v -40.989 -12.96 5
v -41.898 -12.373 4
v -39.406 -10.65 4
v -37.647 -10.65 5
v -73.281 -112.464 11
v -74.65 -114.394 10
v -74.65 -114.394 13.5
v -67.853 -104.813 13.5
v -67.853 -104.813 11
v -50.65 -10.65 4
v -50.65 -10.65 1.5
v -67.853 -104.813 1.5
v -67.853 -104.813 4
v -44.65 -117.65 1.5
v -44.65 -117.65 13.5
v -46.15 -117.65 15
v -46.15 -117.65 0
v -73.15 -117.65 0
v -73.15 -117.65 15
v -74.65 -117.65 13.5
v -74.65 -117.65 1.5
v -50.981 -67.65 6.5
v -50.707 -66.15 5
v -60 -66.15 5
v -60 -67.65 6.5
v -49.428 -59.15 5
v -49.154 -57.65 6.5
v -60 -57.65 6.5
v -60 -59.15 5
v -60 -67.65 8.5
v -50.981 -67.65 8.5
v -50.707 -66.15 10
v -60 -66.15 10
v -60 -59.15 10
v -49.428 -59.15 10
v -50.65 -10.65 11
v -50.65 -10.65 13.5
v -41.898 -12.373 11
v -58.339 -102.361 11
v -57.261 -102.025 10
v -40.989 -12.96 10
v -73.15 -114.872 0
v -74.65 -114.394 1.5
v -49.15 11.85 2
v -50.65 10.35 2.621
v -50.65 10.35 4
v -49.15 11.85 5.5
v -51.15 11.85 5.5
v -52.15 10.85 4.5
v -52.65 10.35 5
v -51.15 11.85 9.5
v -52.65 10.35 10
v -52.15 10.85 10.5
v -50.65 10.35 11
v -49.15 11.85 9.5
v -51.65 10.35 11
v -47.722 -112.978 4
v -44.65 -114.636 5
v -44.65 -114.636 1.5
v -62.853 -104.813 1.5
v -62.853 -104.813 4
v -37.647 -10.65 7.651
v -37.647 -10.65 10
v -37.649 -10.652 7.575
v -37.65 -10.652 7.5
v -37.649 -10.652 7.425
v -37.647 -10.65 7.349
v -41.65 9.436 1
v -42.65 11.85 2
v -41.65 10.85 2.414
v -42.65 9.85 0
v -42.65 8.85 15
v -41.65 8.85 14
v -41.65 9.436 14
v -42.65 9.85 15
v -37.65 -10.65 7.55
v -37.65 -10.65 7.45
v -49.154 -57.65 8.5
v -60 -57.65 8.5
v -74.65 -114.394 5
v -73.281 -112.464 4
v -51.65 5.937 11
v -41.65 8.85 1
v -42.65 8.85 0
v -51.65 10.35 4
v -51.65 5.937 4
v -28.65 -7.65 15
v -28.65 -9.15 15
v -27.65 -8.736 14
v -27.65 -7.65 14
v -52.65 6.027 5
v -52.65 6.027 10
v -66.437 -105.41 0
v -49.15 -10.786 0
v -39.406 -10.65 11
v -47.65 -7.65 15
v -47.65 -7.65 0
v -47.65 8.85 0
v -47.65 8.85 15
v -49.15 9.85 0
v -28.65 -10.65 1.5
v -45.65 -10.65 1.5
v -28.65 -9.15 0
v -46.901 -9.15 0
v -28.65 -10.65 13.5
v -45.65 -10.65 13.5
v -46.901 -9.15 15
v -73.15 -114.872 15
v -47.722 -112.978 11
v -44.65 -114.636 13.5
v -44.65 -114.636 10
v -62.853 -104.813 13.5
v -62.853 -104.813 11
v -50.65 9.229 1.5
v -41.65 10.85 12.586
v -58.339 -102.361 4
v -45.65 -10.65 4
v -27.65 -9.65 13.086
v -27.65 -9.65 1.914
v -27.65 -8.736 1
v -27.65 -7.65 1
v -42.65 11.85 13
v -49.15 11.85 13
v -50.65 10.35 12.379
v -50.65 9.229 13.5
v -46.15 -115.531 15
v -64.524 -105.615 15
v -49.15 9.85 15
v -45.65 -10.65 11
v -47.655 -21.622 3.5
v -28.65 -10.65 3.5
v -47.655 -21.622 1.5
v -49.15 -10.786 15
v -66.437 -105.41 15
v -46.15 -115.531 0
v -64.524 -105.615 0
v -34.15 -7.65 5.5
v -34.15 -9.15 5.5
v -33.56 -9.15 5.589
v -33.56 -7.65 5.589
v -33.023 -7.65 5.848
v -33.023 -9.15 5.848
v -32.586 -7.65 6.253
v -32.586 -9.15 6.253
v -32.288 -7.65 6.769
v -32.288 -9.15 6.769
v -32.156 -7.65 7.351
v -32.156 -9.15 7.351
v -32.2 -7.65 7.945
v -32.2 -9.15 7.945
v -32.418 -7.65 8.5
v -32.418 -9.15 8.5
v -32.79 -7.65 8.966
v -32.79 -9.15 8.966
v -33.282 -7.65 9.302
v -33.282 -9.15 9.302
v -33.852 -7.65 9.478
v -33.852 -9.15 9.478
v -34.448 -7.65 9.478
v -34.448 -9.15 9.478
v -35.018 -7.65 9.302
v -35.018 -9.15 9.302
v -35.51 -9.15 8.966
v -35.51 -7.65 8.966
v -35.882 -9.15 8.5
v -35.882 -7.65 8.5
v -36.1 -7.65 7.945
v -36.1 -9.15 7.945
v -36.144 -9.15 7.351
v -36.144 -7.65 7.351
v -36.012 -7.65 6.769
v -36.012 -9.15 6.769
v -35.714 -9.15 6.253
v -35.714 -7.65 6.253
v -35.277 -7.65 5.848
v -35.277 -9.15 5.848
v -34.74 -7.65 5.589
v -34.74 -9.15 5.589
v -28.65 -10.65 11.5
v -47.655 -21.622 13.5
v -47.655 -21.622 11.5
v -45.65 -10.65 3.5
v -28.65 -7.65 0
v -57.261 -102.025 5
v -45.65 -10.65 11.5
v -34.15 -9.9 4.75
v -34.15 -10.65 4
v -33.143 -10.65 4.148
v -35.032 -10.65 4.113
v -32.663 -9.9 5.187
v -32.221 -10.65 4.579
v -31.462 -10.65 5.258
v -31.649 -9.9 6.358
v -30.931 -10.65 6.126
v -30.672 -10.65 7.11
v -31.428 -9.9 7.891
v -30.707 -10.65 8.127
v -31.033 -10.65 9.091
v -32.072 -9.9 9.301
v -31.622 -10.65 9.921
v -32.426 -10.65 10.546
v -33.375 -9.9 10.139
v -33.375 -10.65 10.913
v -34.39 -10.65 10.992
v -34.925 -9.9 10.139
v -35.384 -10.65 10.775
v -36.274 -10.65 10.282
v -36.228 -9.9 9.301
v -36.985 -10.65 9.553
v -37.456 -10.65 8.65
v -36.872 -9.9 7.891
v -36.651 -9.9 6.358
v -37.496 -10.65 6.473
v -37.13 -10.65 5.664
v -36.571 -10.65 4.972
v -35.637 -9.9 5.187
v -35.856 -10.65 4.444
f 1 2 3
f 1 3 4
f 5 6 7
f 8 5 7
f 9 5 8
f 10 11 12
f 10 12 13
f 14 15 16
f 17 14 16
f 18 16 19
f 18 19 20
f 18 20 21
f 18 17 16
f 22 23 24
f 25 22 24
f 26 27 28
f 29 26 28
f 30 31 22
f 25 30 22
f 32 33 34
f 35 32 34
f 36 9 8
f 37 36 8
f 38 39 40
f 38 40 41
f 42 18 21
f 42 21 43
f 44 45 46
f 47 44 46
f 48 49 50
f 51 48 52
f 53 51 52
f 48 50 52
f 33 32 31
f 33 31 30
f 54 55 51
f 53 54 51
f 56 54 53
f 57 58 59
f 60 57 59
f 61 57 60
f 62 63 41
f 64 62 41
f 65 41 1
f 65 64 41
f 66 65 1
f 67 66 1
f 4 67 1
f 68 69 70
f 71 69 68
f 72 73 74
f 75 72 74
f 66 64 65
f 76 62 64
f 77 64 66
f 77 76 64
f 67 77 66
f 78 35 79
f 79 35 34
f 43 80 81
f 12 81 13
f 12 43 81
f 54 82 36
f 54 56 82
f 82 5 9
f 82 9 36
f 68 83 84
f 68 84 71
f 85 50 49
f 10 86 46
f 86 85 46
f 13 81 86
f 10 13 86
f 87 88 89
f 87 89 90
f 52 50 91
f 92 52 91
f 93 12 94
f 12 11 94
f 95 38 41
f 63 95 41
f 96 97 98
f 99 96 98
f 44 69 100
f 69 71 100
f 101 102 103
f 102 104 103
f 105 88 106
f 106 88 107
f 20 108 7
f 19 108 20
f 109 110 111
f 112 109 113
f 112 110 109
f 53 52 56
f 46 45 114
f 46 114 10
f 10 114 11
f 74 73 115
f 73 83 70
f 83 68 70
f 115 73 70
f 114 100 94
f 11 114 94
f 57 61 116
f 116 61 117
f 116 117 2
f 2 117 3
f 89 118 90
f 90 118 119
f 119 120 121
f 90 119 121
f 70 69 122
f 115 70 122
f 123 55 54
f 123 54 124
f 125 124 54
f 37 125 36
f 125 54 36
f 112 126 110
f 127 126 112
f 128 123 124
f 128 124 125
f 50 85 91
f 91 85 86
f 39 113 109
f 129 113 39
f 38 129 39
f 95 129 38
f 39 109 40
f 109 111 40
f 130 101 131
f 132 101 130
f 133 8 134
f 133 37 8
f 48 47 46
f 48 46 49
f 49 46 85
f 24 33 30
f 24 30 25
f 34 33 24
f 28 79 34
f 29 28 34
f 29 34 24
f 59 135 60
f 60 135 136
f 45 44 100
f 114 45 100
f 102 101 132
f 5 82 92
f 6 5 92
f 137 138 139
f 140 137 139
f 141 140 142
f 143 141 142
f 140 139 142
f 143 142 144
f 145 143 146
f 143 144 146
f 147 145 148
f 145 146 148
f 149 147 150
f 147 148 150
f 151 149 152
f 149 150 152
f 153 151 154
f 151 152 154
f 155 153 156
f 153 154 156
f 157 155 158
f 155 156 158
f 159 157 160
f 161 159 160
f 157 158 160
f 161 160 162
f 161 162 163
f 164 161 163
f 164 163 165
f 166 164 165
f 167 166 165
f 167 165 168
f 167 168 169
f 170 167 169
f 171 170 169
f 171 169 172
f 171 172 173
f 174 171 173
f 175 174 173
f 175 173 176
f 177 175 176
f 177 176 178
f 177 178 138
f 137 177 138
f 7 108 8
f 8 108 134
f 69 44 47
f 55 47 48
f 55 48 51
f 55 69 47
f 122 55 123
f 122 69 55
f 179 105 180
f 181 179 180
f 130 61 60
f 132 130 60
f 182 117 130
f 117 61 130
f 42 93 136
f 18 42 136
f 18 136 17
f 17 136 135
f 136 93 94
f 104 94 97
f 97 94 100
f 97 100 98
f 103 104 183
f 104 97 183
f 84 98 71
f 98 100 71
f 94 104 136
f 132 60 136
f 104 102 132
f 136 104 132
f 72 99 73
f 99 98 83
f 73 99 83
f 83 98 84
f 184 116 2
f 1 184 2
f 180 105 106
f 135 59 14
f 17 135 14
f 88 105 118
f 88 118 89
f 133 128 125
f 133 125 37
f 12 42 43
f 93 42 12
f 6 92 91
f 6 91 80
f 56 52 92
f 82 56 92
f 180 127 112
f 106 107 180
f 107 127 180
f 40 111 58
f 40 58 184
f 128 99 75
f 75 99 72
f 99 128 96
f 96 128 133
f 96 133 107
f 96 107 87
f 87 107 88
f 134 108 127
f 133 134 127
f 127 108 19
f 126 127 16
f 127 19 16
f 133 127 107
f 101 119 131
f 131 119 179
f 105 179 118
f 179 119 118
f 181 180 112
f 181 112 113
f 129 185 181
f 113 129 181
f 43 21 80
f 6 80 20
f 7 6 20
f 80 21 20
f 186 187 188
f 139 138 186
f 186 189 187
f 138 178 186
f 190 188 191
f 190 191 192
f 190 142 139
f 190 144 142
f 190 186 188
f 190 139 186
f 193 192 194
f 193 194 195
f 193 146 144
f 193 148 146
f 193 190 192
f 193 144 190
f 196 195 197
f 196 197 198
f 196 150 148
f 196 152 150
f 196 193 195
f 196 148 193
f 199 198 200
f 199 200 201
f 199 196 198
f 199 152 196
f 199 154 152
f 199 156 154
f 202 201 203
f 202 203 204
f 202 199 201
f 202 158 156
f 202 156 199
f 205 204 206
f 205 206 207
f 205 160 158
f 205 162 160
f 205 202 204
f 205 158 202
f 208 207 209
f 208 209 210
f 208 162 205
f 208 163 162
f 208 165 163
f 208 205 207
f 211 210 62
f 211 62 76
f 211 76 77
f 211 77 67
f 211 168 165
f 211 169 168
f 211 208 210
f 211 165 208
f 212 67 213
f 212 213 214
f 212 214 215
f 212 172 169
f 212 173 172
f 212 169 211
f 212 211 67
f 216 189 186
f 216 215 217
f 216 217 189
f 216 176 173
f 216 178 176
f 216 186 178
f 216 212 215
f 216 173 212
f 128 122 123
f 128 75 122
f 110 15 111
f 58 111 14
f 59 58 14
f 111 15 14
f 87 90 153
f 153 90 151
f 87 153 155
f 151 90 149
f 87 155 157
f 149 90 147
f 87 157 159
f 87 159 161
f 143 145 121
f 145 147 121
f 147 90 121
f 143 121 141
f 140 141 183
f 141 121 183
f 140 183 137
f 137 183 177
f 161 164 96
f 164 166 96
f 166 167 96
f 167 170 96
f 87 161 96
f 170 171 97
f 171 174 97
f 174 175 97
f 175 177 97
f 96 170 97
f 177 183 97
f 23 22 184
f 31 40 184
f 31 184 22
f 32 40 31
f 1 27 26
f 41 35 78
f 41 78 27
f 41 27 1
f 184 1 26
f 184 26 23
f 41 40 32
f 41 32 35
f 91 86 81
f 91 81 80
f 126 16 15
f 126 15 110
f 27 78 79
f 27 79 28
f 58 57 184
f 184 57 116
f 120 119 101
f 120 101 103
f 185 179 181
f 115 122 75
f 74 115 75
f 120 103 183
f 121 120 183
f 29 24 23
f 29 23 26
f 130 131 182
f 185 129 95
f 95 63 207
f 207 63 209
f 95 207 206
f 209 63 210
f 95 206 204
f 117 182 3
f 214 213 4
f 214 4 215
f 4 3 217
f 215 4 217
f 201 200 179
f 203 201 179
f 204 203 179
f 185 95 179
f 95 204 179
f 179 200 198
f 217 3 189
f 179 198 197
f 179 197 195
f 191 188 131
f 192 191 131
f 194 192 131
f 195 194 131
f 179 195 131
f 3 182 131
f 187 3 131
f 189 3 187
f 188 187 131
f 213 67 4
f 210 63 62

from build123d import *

# Parameters (mm, degrees)
RESSALTO_EXTRUS_O1_DEPTH  = 15
ESBO_O7_W                 = 30
ESBO_O7_H                 = 15
RESSALTO_EXTRUS_O3_DEPTH  = 3
ESBO_O14_W                = 7
ESBO_O14_H                = 107.753429602
RESSALTO_EXTRUS_O5_DEPTH  = 2
ESBO_O15_W                = 7
ESBO_O15_H                = 107.852923352
RESSALTO_EXTRUS_O6_DEPTH  = 2
ESBO_O16_W                = 7
ESBO_O16_H                = 22.5
RESSALTO_EXTRUS_O9_DEPTH  = 2
CHANFRO11_SIZE            = 20.026147127
CHANFRO11_SIZE_2          = 10
CHANFRO12_SIZE            = 5.181688732
CHANFRO12_SIZE_2          = 10
CHANFRO13_SIZE            = 2
CHANFRO14_SIZE            = 4.8
CHANFRO14_SIZE2           = 5.970145796
CHANFRO16_SIZE            = 1.5
CHANFRO17_SIZE            = 1.5
CHANFRO18_SIZE            = 1
ESBO_O17_R                = 2
CORTE_EXTRUS_O1_DEPTH     = 5
CHANFRO20_SIZE            = 1
RESSALTO_EXTRUS_O10_DEPTH = 7
RESSALTO_EXTRUS_O11_DEPTH = 2
RESSALTO_EXTRUS_O13_DEPTH = 2
ESBO_O23_W                = 5
ESBO_O23_H                = 10
CORTE_EXTRUS_O2_DEPTH     = 60
CHANFRO22_SIZE            = 1.5
CHANFRO21_SIZE            = 1


# Some blends are built 0.0001 mm under size
with BuildPart() as part:
    # Esboço2 → Ressalto-extrusão1 (new body)
    with BuildSketch(Plane.XY):
        Polygon((-41.65, 8.85), (-41.65, 11.85), (-50.65, 11.85), (-50.65, -10.65), (-27.65, -10.65), (-27.65, -7.65), (-47.65, -7.65), (-47.65, 8.85), align=None)
    extrude(amount=RESSALTO_EXTRUS_O1_DEPTH)



with BuildPart() as body_2:
    # Esboço7 → Ressalto-extrusão3 (new body)
    with BuildSketch(Plane(origin=(0, -117.65, 0), x_dir=(-1, 0, 0), z_dir=(0, -1, 0))):
        with Locations((59.65, -7.5)):
            Rectangle(ESBO_O7_W, ESBO_O7_H)
    extrude(amount=-RESSALTO_EXTRUS_O3_DEPTH)


with BuildPart() as part_1:
    add(part.part)

    add(body_2.part)  # Loft3 merges body 2
    # Esboço9 → Loft3 section 0
    with BuildSketch(Plane(origin=(0, -114.65, 0), x_dir=(1, 0, 0), z_dir=(0, 1, 0))):
        with BuildLine():
            Line((-69.65, -15), (-64.65, -15))
            Line((-64.65, -15), (-64.65, 0))
            Line((-64.65, 0), (-69.65, 0))
            Line((-69.65, 0), (-69.65, -15))
        make_face()
    # Esboço8 → Loft3 section 1
    with BuildSketch(Plane.XZ.offset(10.65)):
        with BuildLine():
            Line((-50.65, 15), (-45.65, 15))
            Line((-45.65, 15), (-45.65, 0))
            Line((-45.65, 0), (-50.65, 0))
            Line((-50.65, 0), (-50.65, 15))
        make_face()
    loft()

    # Esboço14 → Ressalto-extrusão5 (add)
    with BuildSketch(Plane(origin=(-42.292744028, 7.726559005, 0), x_dir=(0, 0, -1), z_dir=(0.9837182167305484, -0.17971775113346497, 0))):
        with Locations((-7.5, -70.525331358)):
            Rectangle(ESBO_O14_W, ESBO_O14_H)
    extrude(amount=RESSALTO_EXTRUS_O5_DEPTH)

    # Esboço15 → Ressalto-extrusão6 (add)
    with BuildSketch(Plane(origin=(-47.131251678, 8.610517133, 0), x_dir=(0, 0, 1), z_dir=(-0.9837182167305483, 0.17971775113346522, 0))):
        with Locations((7.5, -73.505764779)):
            Rectangle(ESBO_O15_W, ESBO_O15_H)
    extrude(amount=RESSALTO_EXTRUS_O6_DEPTH)

    # Esboço16 → Ressalto-extrusão9 (add)
    with BuildSketch(Plane.ZY.offset(50.65)):
        with Locations((7.5, 0.6)):
            Rectangle(ESBO_O16_W, ESBO_O16_H)
    extrude(amount=RESSALTO_EXTRUS_O9_DEPTH)

    # Chanfro11
    # the kernel refuses this chamfer: 20.026147127, 10 mm, written as the material it adds along each edge
    with BuildSketch(Plane(origin=(-64.65, -114.65, 55.83646579), x_dir=(0.9998316750706326, -0.018347248443652868, 0), z_dir=(0, 0, -1))) as chanfro11_piece_1_section:
        Polygon((CHANFRO11_SIZE * 0.999831675085, -CHANFRO11_SIZE * 0.0183472484439), (CHANFRO11_SIZE_2 * 0.161638977635, -CHANFRO11_SIZE_2 * 0.986849958661), (0, 0), align=None)
    chanfro11_piece_1 = extrude(amount=55.83646579, mode=Mode.PRIVATE)
    chanfro11_piece_1 = split(chanfro11_piece_1, bisect_by=Plane(origin=(-44.65, -111.70383057, 13), z_dir=(-1, 0, 0)), keep=Keep.TOP, mode=Mode.PRIVATE)
    chanfro11_piece_1 = split(chanfro11_piece_1, bisect_by=Plane(origin=(-56.081001228, -111.70383057, 15), z_dir=(0, 0, -1)), keep=Keep.TOP, mode=Mode.PRIVATE)
    add(chanfro11_piece_1)

    # Chanfro12
    # the kernel refuses this chamfer: 10, 5.181688732 mm, written as the material it adds along each edge
    with BuildSketch(Plane(origin=(-69.65, -114.65, -14.909754714), x_dir=(-0.9981888061534079, -0.06015901653147684, 0), z_dir=(0, 0, 1))) as chanfro12_piece_1_section:
        Polygon((CHANFRO12_SIZE * 0.99818880622, -CHANFRO12_SIZE * 0.0601590165355), (-CHANFRO12_SIZE_2 * 0.238571767911, -CHANFRO12_SIZE_2 * 0.971124869188), (0, 0), align=None)
    chanfro12_piece_1 = extrude(amount=29.909754714, mode=Mode.PRIVATE)
    chanfro12_piece_1 = split(chanfro12_piece_1, bisect_by=Plane(origin=(-74.65, -111.318186465, 5.5), z_dir=(1, 0, 0)), keep=Keep.TOP, mode=Mode.PRIVATE)
    chanfro12_piece_1 = split(chanfro12_piece_1, bisect_by=Plane(origin=(-70.664221075, -111.318186465, 0), z_dir=(0, 0, 1)), keep=Keep.TOP, mode=Mode.PRIVATE)
    add(chanfro12_piece_1)

    # Chanfro13
    chanfro13_edges = [part_1.edges().sort_by_distance(p)[0] for p in [
        (-46.15, 11.85, 15),
        (-46.15, 11.85, 0),
    ]]
    chamfer(chanfro13_edges, length=CHANFRO13_SIZE)

    # Chanfro14
    chanfro14_edges = [part_1.edges().sort_by_distance(p)[0] for p in [
        (-43.616897465, -10.65, 7.5),
    ]]
    chanfro14_side = [part_1.faces().sort_by_distance(p)[0] for p in [
        (-52.309535597, -58.230756092, 7.5),
    ]]
    chamfer(chanfro14_edges, length=CHANFRO14_SIZE, length2=CHANFRO14_SIZE2, reference=chanfro14_side[0])

    # Chanfro16
    chanfro16_edges = [part_1.edges().sort_by_distance(p)[0] for p in [
        (-50.65, 11.85, 3),
        (-51.65, 11.85, 11),
        (-51.65, 11.85, 4),
        (-52.65, 11.85, 7.5),
        (-54.251411244, -57.731408916, 0),
        (-54.251411244, -57.731408916, 15),
        (-53.751411244, -109.724353826, 0),
        (-53.751411244, -109.724353826, 15),
        (-59.251411244, -57.731408916, 15),
        (-59.251411244, -57.731408916, 0),
        (-71.251411244, -109.603357662, 15),
        (-71.251411244, -109.603357662, 0),
        (-50.65, 11.85, 12),
        (-50.65, -0.4, 0),
        (-50.65, 10.85, 1),
        (-50.65, -0.4, 15),
        (-50.65, 10.85, 14),
        (-74.65, -116.021948745, 0),
        (-74.65, -116.021948745, 15),
        (-44.65, -116.14294491, 15),
        (-44.65, -116.14294491, 0),
    ]]
    chamfer(chanfro16_edges, length=CHANFRO16_SIZE)

    # Chanfro17
    chanfro17_edges = [part_1.edges().sort_by_distance(p)[0] for p in [
        (-37.412413451, -10.65, 0),
        (-37.412413451, -10.65, 15),
    ]]
    chamfer(chanfro17_edges, length=CHANFRO17_SIZE)

    # Chanfro18
    chanfro18_edges = [part_1.edges().sort_by_distance(p)[0] for p in [
        (-61.620535422, -59.570685278, 4),
        (-52.65, -0.059403589, 11),
        (-52.7408582, -60.591679812, 4),
        (-61.620535422, -59.570685278, 11),
        (-52.7408582, -60.591679812, 11),
        (-41.06314717, -13.01092372, 4),
        (-41.06314717, -13.01092372, 11),
        (-52.65, -0.059403589, 4),
    ]]
    chamfer(chanfro18_edges, length=CHANFRO18_SIZE)

    # Esboço17 → Corte-extrusão1 (cut)
    with BuildSketch(Plane.XZ.offset(10.65)):
        with Locations(Location((-34.15, 7.5, 0), (0, 0, 270))):
            Circle(ESBO_O17_R)
    extrude(amount=-CORTE_EXTRUS_O1_DEPTH, mode=Mode.SUBTRACT)

    # Chanfro20
    chanfro20_edges = [part_1.edges().sort_by_distance(p)[0] for p in [
        (-41.65, 11.85, 7.5),
        (-41.65, 10.85, 14),
        (-41.65, 10.85, 1),
        (-41.65, 9.35, 15),
        (-27.65, -10.65, 7.5),
        (-27.65, -8.4, 0),
        (-27.65, -8.4, 15),
        (-27.65, -9.9, 14.25),
        (-27.65, -9.9, 0.75),
        (-41.65, 9.35, 0),
    ]]
    chamfer(chanfro20_edges, length=CHANFRO20_SIZE)

    # Esboço18 → Ressalto-extrusão10 (add)
    with BuildSketch(Plane.XY.offset(11)):
        Polygon((-44.65, -114.635889819), (-57.26077437, -102.025115449), (-40.293205201, -9.15), (-44.359410271, -9.15), (-60.698866461, -98.587023358), (-61.558389484, -97.727500335), (-67.574940752, -97.727500335), (-51.65, -10.559403589), (-51.65, 10.35), (-52.65, 10.35), (-52.65, 6.027155141), (-74.65, -114.393897491), (-64.647422179, -114.635889819), align=None)
    extrude(amount=-RESSALTO_EXTRUS_O10_DEPTH)

    # Esboço19 → Ressalto-extrusão11 (add)
    with BuildSketch(Plane(origin=(0, 0, 1.5), x_dir=(-1, 0, 0), z_dir=(0, 0, -1))):
        Polygon((28.65, -10.65), (49.35917828, -22.606449655), (46.90078844, -9.15), (46.90078844, -7.65), (28.65, -7.65), align=None)
    extrude(amount=-RESSALTO_EXTRUS_O11_DEPTH)

    # Esboço21 → Ressalto-extrusão13 (add)
    with BuildSketch(Plane.XY.offset(13.5)):
        Polygon((-28.65, -10.65), (-49.35917828, -22.606449655), (-46.90078844, -9.15), (-46.90078844, -7.65), (-28.65, -7.65), align=None)
    extrude(amount=-RESSALTO_EXTRUS_O13_DEPTH)

    # Esboço23 → Corte-extrusão2 (cut)
    with BuildSketch(Plane(origin=(0, 0, 0), x_dir=(0, 0, -1), z_dir=(1, 0, 0))):
        with Locations((-7.5, -62.65)):
            Rectangle(ESBO_O23_W, ESBO_O23_H)
    extrude(amount=-CORTE_EXTRUS_O2_DEPTH, mode=Mode.SUBTRACT)

    # Chanfro22
    chanfro22_edges = [part_1.edges().sort_by_distance(p)[0] for p in [
        (-55.490352601, -67.65, 10),
        (-54.576891062, -57.65, 10),
        (-54.576891062, -57.65, 5),
        (-55.490352601, -67.65, 5),
    ]]
    chamfer(chanfro22_edges, length=CHANFRO22_SIZE)

    # Chanfro21
    chanfro21_edges = [part_1.edges().sort_by_distance(p)[0] for p in [
        (-50.955387185, -108.330502634, 11),
        (-50.955387185, -108.330502634, 4),
        (-48.997924928, -56.796886925, 11),
        (-48.997924928, -56.796886925, 4),
        (-52.65, 8.18857757, 4),
        (-63.65, -54.183371175, 11),
        (-63.65, -54.183371175, 4),
        (-52.65, 8.18857757, 11),
    ]]
    chamfer(chanfro21_edges, length=CHANFRO21_SIZE - 0.0001)  # a hair under: the kernel refuses the full size

    # Esboço26 → Corte-Revolução1 (revolve, cut)
    with BuildSketch(Plane.XY.offset(7.5), mode=Mode.PRIVATE) as corte_revolu_o1_sk:
        Polygon((-30.65, -11.703246541), (-30.65, -10.65), (-34.15, -7.15), (-34.15, -10.65), (-34.15, -11.703246541), align=None)
    revolve(corte_revolu_o1_sk.sketch.rotate(Axis((-34.15, -7.15, 7.5), (0, -1, 0)), 270), axis=Axis((-34.15, -7.15, 7.5), (0, -1, 0)), mode=Mode.SUBTRACT)


solid = part_1.part
